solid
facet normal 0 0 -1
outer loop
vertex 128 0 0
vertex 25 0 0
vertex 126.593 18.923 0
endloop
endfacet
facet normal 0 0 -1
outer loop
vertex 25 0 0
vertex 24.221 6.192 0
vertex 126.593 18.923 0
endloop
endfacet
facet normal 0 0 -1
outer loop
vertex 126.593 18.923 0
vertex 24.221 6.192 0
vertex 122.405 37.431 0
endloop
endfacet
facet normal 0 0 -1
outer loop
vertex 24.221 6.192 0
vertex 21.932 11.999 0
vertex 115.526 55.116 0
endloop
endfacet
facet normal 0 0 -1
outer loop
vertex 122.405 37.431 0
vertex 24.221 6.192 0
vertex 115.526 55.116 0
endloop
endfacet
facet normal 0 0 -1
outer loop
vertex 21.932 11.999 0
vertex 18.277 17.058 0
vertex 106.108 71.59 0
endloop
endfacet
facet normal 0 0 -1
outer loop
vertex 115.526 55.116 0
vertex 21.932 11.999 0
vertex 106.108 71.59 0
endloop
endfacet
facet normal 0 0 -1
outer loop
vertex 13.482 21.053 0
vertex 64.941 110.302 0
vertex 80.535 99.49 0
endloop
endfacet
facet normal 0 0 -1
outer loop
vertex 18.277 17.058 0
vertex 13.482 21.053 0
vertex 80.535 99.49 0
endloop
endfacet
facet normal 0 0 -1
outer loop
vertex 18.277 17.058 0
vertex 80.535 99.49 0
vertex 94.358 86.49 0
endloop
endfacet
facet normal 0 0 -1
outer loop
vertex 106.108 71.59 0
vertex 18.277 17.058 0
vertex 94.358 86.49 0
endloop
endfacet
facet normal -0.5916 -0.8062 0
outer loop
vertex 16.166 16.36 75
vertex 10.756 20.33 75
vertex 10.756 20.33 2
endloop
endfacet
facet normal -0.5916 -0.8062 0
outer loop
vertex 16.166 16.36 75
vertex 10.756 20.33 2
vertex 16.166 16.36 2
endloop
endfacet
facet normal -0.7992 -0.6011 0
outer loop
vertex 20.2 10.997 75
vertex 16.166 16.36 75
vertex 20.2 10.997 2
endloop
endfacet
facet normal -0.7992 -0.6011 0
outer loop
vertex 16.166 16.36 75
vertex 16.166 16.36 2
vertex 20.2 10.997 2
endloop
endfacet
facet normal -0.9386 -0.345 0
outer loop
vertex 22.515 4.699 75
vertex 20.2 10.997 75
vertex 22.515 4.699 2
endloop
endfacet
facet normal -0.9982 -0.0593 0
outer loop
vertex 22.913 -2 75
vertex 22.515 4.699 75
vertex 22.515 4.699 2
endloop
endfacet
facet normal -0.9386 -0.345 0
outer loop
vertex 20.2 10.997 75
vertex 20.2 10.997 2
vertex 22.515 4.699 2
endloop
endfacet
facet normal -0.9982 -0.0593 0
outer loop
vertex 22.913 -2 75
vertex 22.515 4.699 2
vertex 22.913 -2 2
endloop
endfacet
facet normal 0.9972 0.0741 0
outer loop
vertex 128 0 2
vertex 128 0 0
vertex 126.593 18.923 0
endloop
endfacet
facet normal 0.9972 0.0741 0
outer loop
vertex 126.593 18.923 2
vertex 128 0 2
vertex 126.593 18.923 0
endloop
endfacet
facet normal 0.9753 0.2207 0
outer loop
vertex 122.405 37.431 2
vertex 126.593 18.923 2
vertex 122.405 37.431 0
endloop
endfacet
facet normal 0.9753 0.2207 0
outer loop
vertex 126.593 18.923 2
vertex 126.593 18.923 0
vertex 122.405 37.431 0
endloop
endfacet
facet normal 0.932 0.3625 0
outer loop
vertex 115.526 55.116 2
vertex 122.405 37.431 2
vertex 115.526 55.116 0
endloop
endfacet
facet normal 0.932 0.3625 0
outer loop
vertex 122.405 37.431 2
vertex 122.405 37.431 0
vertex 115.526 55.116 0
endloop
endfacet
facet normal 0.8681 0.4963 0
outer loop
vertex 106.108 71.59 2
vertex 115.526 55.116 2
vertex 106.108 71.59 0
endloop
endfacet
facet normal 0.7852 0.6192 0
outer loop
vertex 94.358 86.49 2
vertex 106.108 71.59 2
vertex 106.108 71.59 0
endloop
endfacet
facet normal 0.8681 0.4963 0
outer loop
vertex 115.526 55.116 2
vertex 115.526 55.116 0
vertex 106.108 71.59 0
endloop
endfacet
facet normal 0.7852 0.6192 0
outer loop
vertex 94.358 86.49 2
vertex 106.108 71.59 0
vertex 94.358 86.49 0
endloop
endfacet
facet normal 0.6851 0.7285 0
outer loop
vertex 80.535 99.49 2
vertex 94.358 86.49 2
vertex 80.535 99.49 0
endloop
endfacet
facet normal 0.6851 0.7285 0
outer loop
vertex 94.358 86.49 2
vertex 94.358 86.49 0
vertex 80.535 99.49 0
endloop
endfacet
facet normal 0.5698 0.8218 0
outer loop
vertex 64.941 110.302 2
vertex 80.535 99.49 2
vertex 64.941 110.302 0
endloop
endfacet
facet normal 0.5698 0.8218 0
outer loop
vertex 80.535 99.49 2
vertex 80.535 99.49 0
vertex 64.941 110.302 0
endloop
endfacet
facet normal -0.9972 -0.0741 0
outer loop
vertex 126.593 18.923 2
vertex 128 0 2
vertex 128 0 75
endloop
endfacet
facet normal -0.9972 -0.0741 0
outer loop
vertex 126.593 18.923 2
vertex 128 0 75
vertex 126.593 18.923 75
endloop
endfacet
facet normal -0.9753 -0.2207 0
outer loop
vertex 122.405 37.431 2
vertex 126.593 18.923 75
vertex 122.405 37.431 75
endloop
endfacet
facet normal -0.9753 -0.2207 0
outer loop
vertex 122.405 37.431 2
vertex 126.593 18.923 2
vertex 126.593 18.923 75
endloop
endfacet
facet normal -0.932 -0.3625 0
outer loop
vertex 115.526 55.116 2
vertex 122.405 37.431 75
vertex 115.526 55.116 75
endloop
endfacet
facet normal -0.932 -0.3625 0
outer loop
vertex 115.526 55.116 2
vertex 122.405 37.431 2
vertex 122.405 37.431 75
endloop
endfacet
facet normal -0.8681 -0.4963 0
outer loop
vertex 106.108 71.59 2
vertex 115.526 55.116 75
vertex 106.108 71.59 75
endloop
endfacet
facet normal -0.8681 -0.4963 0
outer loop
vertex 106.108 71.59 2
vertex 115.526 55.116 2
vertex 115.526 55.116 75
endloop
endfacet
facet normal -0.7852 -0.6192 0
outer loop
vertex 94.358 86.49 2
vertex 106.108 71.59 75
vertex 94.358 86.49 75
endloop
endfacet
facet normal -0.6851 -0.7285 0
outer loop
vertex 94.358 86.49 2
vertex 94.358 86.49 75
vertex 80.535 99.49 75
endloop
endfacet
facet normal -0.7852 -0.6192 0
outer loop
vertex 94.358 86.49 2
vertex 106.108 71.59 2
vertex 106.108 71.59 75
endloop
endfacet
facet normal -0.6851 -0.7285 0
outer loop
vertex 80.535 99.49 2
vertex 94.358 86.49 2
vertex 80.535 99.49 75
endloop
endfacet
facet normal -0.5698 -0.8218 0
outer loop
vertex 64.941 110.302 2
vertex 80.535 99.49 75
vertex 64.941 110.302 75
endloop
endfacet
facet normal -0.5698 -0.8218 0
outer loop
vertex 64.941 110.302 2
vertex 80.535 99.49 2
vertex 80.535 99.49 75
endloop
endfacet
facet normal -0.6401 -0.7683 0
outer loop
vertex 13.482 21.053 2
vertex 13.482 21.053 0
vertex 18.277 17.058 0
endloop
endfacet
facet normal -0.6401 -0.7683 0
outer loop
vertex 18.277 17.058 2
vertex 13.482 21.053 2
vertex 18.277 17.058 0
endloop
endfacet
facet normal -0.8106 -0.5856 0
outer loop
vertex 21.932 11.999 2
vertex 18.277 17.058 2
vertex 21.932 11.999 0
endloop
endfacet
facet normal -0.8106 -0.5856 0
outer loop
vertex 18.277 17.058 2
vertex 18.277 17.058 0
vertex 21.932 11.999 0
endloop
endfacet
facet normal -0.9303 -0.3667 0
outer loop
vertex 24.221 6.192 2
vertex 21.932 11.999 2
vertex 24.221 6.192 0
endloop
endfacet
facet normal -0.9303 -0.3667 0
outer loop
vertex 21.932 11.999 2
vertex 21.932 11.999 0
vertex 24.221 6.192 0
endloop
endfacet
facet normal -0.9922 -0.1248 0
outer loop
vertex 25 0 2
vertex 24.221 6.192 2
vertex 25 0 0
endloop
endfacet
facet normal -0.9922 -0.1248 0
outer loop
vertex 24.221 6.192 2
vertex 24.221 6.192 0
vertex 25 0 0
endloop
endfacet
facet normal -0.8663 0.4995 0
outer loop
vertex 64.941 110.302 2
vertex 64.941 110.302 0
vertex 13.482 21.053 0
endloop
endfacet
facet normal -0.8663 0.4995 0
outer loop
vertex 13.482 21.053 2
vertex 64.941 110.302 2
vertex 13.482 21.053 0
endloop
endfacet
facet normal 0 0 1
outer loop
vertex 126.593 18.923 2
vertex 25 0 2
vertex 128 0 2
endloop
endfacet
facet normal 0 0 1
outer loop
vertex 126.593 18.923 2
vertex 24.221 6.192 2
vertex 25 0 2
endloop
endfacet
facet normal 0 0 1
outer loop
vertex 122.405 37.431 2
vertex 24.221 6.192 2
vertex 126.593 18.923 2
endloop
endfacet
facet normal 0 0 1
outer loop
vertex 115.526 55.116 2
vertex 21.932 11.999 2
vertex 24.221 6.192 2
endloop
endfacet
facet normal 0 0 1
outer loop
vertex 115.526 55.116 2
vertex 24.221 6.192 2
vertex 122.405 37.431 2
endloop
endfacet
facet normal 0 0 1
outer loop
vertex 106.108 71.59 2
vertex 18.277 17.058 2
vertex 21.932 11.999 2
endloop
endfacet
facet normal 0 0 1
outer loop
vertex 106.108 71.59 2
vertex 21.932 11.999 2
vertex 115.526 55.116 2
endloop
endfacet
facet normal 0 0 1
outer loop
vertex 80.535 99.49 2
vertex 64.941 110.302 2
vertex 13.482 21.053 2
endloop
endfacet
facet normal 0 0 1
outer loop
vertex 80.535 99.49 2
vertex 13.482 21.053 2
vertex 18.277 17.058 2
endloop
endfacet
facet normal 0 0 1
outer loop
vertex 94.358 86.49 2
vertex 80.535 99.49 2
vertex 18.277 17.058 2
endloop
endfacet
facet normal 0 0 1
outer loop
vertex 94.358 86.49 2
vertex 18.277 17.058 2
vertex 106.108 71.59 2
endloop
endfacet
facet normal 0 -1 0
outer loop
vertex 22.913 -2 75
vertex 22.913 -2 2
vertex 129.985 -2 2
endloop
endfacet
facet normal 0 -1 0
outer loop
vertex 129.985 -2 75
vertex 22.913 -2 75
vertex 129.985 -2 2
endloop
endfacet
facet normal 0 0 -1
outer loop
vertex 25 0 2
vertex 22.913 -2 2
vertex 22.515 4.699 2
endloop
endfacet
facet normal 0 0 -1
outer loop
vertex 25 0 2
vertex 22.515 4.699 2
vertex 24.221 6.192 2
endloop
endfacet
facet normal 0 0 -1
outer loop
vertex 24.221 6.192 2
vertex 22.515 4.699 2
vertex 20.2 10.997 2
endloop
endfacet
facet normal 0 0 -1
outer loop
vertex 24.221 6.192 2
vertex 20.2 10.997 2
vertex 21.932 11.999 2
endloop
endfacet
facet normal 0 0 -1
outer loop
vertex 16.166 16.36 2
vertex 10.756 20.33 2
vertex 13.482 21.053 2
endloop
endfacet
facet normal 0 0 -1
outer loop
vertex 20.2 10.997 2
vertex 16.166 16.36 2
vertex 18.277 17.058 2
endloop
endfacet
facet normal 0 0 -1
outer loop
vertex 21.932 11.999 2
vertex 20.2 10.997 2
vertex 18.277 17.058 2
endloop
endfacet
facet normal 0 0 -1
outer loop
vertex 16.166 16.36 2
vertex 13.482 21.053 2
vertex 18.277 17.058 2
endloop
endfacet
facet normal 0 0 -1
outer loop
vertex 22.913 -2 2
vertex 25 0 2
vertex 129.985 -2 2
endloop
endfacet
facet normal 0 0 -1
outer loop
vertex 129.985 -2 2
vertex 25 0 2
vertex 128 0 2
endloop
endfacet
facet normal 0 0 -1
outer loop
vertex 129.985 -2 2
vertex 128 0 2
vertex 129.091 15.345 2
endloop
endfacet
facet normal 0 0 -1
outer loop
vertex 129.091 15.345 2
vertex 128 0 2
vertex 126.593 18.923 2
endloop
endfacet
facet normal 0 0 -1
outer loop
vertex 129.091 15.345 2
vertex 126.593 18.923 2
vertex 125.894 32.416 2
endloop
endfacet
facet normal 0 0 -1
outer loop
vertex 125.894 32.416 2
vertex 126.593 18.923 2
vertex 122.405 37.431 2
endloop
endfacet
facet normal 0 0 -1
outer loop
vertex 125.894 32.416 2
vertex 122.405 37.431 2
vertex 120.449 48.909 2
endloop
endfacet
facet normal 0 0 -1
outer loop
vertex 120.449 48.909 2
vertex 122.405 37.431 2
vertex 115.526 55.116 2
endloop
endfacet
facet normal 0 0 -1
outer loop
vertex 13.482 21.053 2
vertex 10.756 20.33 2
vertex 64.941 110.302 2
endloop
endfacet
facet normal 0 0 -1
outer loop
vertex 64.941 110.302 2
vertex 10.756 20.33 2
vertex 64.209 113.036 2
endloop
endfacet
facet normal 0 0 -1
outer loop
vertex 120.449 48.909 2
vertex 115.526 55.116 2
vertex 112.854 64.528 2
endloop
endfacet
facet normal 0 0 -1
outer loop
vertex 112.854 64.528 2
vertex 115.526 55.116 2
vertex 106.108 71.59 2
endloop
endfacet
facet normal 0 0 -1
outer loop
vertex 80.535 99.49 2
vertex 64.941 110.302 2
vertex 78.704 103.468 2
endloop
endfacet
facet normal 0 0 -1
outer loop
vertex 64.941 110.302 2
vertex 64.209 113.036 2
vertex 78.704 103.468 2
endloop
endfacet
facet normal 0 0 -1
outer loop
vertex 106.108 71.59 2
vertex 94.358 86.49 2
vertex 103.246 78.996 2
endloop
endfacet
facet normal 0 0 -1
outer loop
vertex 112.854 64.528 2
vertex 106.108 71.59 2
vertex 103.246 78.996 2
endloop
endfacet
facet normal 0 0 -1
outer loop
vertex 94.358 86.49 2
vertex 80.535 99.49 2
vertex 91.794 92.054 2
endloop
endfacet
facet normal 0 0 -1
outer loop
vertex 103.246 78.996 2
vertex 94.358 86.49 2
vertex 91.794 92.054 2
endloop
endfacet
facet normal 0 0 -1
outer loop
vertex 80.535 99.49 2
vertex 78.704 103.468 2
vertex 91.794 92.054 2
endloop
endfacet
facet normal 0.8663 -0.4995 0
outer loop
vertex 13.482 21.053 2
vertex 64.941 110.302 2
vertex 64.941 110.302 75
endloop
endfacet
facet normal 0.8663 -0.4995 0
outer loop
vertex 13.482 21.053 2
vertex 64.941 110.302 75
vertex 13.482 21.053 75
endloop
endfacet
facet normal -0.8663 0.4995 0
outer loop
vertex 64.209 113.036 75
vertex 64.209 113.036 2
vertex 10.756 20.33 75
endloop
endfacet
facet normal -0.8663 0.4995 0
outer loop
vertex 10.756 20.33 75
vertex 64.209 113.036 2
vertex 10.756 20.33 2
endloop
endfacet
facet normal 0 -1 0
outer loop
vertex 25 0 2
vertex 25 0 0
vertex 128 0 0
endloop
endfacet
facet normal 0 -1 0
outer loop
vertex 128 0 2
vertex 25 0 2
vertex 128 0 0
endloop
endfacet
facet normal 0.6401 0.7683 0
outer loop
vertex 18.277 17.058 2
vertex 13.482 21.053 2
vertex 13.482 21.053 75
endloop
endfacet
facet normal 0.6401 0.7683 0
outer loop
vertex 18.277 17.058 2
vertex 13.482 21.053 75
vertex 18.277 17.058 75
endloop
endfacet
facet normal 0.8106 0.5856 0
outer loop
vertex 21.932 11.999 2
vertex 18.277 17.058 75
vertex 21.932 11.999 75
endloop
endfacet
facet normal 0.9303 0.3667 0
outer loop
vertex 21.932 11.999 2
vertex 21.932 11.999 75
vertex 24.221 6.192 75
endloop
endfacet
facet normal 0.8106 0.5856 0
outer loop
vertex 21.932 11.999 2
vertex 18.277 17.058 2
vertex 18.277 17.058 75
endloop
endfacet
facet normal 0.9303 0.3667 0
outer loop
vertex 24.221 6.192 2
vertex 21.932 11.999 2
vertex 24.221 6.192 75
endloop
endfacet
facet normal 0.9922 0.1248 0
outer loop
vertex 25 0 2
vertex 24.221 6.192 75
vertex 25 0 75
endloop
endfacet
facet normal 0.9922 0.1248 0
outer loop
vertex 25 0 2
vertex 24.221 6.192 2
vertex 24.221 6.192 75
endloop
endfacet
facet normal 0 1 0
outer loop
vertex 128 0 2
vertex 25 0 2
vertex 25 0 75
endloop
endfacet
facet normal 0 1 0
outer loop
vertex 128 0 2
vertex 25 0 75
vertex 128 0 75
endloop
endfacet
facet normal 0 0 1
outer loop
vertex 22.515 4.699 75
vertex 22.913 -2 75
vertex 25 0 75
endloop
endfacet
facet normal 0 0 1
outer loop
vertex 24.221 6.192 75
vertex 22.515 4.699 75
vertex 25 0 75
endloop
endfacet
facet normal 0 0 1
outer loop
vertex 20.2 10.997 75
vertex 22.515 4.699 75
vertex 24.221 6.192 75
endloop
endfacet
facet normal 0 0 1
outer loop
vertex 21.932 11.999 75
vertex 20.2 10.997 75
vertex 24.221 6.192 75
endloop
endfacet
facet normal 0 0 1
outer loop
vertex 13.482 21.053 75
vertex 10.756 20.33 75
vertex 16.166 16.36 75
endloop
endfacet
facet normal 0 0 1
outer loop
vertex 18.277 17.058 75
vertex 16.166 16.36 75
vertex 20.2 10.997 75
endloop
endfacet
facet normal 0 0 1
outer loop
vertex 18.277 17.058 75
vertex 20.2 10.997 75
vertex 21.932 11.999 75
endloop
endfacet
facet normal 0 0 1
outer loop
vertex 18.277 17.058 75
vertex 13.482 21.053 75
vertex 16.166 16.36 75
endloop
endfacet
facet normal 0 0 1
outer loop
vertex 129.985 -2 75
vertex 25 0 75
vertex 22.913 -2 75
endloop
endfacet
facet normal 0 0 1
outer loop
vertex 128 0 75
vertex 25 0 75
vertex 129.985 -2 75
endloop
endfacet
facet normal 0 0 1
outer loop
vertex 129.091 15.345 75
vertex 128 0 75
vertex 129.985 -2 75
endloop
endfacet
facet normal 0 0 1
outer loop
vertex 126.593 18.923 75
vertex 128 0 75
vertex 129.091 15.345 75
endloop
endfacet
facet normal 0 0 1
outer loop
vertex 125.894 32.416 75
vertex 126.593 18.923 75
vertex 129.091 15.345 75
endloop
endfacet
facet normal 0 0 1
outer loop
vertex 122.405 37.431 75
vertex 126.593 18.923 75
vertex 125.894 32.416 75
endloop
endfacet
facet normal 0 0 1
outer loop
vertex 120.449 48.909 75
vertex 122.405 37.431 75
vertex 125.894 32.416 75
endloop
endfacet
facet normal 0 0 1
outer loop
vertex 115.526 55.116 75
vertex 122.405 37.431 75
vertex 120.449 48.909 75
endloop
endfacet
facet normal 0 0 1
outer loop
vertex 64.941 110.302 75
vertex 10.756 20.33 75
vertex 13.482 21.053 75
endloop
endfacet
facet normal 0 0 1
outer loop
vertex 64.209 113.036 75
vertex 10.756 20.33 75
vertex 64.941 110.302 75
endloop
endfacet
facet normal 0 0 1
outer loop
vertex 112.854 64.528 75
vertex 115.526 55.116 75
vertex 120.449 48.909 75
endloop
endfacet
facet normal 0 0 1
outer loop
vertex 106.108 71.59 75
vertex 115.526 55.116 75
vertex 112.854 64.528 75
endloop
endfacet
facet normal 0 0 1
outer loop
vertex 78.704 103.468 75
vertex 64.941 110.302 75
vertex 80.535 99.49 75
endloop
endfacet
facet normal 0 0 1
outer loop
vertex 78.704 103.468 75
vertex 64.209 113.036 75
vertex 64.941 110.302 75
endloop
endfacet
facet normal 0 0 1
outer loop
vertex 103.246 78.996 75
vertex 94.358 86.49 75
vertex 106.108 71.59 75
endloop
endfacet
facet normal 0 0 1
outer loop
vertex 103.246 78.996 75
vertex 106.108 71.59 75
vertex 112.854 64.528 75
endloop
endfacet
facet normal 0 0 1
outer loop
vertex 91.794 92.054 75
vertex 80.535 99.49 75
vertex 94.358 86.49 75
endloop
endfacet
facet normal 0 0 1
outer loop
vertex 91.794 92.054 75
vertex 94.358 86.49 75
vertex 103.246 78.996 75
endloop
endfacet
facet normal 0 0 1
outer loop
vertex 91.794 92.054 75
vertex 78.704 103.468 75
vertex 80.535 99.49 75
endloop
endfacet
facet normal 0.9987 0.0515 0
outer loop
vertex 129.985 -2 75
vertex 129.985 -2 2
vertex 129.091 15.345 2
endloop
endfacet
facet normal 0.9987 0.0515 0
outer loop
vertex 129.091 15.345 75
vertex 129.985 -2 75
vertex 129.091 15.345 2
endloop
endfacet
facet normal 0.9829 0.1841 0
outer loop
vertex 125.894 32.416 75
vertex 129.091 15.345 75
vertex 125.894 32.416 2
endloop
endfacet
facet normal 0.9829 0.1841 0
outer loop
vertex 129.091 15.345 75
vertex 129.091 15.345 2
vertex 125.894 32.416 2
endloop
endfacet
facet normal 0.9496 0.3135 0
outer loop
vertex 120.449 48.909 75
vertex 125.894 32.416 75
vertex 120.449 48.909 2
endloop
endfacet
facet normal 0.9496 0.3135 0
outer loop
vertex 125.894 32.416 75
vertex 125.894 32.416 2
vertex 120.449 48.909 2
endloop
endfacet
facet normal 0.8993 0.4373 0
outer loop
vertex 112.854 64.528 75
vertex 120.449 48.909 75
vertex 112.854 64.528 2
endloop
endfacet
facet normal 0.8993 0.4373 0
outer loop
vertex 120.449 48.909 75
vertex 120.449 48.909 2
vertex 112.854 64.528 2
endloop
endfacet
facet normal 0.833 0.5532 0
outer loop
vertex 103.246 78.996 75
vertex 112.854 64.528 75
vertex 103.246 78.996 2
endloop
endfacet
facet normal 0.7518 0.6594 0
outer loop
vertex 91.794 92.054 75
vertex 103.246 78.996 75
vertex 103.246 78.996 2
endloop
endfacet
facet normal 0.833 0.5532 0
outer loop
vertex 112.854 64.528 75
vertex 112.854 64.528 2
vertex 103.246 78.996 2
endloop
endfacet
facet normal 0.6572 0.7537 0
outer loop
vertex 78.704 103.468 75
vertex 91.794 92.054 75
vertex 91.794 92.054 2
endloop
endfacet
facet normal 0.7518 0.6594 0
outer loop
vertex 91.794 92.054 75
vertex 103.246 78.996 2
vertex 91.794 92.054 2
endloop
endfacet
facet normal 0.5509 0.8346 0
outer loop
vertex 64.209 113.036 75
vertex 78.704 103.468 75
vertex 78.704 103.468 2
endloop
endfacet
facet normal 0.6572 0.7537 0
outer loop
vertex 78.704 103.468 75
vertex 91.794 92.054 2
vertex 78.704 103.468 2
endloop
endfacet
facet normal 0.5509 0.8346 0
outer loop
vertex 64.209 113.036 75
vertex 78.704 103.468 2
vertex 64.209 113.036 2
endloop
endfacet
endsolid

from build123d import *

# Parameters (mm, degrees)
EXTRUDE_1_DEPTH   = 2
EXTRUDE_1_2_DEPTH = 73


with BuildPart() as part:
    # 草图1 → Extrude 1 (new body)
    with BuildSketch(Plane.XY):
        with BuildLine():
            Line((25, 0), (128, 0))
            ThreePointArc((128, 0), (111.122626619, 63.527646369), (64.941221044, 110.302483242))
            Line((64.941221044, 110.302483242), (13.481874136, 21.053243688))
            ThreePointArc((13.481874136, 21.053243688), (21.932246276, 11.999023848), (25, 0))
        make_face()
    extrude(amount=EXTRUDE_1_DEPTH)


with BuildPart() as body_2:
    # 草图2 → Extrude 1 2 (new body)
    with BuildSketch(Plane.XY.offset(2)):
        with BuildLine():
            Line((22.912878475, -2), (129.984614474, -2))
            ThreePointArc((129.984614474, -2), (112.854420307, 64.528131983), (64.208888722, 113.036359677))
            Line((64.208888722, 113.036359677), (10.756175105, 20.329896633))
            ThreePointArc((10.756175105, 20.329896633), (20.200429776, 10.997392275), (22.912878475, -2))
        make_face()
        with BuildLine():
            Line((25, 0), (128, 0))
            ThreePointArc((128, 0), (111.122626619, 63.527646369), (64.941221044, 110.302483242))
            Line((64.941221044, 110.302483242), (13.481874136, 21.053243688))
            ThreePointArc((13.481874136, 21.053243688), (21.932246276, 11.999023848), (25, 0))
        make_face(mode=Mode.SUBTRACT)
    extrude(amount=EXTRUDE_1_2_DEPTH)


solid = Compound([part.part, body_2.part])
